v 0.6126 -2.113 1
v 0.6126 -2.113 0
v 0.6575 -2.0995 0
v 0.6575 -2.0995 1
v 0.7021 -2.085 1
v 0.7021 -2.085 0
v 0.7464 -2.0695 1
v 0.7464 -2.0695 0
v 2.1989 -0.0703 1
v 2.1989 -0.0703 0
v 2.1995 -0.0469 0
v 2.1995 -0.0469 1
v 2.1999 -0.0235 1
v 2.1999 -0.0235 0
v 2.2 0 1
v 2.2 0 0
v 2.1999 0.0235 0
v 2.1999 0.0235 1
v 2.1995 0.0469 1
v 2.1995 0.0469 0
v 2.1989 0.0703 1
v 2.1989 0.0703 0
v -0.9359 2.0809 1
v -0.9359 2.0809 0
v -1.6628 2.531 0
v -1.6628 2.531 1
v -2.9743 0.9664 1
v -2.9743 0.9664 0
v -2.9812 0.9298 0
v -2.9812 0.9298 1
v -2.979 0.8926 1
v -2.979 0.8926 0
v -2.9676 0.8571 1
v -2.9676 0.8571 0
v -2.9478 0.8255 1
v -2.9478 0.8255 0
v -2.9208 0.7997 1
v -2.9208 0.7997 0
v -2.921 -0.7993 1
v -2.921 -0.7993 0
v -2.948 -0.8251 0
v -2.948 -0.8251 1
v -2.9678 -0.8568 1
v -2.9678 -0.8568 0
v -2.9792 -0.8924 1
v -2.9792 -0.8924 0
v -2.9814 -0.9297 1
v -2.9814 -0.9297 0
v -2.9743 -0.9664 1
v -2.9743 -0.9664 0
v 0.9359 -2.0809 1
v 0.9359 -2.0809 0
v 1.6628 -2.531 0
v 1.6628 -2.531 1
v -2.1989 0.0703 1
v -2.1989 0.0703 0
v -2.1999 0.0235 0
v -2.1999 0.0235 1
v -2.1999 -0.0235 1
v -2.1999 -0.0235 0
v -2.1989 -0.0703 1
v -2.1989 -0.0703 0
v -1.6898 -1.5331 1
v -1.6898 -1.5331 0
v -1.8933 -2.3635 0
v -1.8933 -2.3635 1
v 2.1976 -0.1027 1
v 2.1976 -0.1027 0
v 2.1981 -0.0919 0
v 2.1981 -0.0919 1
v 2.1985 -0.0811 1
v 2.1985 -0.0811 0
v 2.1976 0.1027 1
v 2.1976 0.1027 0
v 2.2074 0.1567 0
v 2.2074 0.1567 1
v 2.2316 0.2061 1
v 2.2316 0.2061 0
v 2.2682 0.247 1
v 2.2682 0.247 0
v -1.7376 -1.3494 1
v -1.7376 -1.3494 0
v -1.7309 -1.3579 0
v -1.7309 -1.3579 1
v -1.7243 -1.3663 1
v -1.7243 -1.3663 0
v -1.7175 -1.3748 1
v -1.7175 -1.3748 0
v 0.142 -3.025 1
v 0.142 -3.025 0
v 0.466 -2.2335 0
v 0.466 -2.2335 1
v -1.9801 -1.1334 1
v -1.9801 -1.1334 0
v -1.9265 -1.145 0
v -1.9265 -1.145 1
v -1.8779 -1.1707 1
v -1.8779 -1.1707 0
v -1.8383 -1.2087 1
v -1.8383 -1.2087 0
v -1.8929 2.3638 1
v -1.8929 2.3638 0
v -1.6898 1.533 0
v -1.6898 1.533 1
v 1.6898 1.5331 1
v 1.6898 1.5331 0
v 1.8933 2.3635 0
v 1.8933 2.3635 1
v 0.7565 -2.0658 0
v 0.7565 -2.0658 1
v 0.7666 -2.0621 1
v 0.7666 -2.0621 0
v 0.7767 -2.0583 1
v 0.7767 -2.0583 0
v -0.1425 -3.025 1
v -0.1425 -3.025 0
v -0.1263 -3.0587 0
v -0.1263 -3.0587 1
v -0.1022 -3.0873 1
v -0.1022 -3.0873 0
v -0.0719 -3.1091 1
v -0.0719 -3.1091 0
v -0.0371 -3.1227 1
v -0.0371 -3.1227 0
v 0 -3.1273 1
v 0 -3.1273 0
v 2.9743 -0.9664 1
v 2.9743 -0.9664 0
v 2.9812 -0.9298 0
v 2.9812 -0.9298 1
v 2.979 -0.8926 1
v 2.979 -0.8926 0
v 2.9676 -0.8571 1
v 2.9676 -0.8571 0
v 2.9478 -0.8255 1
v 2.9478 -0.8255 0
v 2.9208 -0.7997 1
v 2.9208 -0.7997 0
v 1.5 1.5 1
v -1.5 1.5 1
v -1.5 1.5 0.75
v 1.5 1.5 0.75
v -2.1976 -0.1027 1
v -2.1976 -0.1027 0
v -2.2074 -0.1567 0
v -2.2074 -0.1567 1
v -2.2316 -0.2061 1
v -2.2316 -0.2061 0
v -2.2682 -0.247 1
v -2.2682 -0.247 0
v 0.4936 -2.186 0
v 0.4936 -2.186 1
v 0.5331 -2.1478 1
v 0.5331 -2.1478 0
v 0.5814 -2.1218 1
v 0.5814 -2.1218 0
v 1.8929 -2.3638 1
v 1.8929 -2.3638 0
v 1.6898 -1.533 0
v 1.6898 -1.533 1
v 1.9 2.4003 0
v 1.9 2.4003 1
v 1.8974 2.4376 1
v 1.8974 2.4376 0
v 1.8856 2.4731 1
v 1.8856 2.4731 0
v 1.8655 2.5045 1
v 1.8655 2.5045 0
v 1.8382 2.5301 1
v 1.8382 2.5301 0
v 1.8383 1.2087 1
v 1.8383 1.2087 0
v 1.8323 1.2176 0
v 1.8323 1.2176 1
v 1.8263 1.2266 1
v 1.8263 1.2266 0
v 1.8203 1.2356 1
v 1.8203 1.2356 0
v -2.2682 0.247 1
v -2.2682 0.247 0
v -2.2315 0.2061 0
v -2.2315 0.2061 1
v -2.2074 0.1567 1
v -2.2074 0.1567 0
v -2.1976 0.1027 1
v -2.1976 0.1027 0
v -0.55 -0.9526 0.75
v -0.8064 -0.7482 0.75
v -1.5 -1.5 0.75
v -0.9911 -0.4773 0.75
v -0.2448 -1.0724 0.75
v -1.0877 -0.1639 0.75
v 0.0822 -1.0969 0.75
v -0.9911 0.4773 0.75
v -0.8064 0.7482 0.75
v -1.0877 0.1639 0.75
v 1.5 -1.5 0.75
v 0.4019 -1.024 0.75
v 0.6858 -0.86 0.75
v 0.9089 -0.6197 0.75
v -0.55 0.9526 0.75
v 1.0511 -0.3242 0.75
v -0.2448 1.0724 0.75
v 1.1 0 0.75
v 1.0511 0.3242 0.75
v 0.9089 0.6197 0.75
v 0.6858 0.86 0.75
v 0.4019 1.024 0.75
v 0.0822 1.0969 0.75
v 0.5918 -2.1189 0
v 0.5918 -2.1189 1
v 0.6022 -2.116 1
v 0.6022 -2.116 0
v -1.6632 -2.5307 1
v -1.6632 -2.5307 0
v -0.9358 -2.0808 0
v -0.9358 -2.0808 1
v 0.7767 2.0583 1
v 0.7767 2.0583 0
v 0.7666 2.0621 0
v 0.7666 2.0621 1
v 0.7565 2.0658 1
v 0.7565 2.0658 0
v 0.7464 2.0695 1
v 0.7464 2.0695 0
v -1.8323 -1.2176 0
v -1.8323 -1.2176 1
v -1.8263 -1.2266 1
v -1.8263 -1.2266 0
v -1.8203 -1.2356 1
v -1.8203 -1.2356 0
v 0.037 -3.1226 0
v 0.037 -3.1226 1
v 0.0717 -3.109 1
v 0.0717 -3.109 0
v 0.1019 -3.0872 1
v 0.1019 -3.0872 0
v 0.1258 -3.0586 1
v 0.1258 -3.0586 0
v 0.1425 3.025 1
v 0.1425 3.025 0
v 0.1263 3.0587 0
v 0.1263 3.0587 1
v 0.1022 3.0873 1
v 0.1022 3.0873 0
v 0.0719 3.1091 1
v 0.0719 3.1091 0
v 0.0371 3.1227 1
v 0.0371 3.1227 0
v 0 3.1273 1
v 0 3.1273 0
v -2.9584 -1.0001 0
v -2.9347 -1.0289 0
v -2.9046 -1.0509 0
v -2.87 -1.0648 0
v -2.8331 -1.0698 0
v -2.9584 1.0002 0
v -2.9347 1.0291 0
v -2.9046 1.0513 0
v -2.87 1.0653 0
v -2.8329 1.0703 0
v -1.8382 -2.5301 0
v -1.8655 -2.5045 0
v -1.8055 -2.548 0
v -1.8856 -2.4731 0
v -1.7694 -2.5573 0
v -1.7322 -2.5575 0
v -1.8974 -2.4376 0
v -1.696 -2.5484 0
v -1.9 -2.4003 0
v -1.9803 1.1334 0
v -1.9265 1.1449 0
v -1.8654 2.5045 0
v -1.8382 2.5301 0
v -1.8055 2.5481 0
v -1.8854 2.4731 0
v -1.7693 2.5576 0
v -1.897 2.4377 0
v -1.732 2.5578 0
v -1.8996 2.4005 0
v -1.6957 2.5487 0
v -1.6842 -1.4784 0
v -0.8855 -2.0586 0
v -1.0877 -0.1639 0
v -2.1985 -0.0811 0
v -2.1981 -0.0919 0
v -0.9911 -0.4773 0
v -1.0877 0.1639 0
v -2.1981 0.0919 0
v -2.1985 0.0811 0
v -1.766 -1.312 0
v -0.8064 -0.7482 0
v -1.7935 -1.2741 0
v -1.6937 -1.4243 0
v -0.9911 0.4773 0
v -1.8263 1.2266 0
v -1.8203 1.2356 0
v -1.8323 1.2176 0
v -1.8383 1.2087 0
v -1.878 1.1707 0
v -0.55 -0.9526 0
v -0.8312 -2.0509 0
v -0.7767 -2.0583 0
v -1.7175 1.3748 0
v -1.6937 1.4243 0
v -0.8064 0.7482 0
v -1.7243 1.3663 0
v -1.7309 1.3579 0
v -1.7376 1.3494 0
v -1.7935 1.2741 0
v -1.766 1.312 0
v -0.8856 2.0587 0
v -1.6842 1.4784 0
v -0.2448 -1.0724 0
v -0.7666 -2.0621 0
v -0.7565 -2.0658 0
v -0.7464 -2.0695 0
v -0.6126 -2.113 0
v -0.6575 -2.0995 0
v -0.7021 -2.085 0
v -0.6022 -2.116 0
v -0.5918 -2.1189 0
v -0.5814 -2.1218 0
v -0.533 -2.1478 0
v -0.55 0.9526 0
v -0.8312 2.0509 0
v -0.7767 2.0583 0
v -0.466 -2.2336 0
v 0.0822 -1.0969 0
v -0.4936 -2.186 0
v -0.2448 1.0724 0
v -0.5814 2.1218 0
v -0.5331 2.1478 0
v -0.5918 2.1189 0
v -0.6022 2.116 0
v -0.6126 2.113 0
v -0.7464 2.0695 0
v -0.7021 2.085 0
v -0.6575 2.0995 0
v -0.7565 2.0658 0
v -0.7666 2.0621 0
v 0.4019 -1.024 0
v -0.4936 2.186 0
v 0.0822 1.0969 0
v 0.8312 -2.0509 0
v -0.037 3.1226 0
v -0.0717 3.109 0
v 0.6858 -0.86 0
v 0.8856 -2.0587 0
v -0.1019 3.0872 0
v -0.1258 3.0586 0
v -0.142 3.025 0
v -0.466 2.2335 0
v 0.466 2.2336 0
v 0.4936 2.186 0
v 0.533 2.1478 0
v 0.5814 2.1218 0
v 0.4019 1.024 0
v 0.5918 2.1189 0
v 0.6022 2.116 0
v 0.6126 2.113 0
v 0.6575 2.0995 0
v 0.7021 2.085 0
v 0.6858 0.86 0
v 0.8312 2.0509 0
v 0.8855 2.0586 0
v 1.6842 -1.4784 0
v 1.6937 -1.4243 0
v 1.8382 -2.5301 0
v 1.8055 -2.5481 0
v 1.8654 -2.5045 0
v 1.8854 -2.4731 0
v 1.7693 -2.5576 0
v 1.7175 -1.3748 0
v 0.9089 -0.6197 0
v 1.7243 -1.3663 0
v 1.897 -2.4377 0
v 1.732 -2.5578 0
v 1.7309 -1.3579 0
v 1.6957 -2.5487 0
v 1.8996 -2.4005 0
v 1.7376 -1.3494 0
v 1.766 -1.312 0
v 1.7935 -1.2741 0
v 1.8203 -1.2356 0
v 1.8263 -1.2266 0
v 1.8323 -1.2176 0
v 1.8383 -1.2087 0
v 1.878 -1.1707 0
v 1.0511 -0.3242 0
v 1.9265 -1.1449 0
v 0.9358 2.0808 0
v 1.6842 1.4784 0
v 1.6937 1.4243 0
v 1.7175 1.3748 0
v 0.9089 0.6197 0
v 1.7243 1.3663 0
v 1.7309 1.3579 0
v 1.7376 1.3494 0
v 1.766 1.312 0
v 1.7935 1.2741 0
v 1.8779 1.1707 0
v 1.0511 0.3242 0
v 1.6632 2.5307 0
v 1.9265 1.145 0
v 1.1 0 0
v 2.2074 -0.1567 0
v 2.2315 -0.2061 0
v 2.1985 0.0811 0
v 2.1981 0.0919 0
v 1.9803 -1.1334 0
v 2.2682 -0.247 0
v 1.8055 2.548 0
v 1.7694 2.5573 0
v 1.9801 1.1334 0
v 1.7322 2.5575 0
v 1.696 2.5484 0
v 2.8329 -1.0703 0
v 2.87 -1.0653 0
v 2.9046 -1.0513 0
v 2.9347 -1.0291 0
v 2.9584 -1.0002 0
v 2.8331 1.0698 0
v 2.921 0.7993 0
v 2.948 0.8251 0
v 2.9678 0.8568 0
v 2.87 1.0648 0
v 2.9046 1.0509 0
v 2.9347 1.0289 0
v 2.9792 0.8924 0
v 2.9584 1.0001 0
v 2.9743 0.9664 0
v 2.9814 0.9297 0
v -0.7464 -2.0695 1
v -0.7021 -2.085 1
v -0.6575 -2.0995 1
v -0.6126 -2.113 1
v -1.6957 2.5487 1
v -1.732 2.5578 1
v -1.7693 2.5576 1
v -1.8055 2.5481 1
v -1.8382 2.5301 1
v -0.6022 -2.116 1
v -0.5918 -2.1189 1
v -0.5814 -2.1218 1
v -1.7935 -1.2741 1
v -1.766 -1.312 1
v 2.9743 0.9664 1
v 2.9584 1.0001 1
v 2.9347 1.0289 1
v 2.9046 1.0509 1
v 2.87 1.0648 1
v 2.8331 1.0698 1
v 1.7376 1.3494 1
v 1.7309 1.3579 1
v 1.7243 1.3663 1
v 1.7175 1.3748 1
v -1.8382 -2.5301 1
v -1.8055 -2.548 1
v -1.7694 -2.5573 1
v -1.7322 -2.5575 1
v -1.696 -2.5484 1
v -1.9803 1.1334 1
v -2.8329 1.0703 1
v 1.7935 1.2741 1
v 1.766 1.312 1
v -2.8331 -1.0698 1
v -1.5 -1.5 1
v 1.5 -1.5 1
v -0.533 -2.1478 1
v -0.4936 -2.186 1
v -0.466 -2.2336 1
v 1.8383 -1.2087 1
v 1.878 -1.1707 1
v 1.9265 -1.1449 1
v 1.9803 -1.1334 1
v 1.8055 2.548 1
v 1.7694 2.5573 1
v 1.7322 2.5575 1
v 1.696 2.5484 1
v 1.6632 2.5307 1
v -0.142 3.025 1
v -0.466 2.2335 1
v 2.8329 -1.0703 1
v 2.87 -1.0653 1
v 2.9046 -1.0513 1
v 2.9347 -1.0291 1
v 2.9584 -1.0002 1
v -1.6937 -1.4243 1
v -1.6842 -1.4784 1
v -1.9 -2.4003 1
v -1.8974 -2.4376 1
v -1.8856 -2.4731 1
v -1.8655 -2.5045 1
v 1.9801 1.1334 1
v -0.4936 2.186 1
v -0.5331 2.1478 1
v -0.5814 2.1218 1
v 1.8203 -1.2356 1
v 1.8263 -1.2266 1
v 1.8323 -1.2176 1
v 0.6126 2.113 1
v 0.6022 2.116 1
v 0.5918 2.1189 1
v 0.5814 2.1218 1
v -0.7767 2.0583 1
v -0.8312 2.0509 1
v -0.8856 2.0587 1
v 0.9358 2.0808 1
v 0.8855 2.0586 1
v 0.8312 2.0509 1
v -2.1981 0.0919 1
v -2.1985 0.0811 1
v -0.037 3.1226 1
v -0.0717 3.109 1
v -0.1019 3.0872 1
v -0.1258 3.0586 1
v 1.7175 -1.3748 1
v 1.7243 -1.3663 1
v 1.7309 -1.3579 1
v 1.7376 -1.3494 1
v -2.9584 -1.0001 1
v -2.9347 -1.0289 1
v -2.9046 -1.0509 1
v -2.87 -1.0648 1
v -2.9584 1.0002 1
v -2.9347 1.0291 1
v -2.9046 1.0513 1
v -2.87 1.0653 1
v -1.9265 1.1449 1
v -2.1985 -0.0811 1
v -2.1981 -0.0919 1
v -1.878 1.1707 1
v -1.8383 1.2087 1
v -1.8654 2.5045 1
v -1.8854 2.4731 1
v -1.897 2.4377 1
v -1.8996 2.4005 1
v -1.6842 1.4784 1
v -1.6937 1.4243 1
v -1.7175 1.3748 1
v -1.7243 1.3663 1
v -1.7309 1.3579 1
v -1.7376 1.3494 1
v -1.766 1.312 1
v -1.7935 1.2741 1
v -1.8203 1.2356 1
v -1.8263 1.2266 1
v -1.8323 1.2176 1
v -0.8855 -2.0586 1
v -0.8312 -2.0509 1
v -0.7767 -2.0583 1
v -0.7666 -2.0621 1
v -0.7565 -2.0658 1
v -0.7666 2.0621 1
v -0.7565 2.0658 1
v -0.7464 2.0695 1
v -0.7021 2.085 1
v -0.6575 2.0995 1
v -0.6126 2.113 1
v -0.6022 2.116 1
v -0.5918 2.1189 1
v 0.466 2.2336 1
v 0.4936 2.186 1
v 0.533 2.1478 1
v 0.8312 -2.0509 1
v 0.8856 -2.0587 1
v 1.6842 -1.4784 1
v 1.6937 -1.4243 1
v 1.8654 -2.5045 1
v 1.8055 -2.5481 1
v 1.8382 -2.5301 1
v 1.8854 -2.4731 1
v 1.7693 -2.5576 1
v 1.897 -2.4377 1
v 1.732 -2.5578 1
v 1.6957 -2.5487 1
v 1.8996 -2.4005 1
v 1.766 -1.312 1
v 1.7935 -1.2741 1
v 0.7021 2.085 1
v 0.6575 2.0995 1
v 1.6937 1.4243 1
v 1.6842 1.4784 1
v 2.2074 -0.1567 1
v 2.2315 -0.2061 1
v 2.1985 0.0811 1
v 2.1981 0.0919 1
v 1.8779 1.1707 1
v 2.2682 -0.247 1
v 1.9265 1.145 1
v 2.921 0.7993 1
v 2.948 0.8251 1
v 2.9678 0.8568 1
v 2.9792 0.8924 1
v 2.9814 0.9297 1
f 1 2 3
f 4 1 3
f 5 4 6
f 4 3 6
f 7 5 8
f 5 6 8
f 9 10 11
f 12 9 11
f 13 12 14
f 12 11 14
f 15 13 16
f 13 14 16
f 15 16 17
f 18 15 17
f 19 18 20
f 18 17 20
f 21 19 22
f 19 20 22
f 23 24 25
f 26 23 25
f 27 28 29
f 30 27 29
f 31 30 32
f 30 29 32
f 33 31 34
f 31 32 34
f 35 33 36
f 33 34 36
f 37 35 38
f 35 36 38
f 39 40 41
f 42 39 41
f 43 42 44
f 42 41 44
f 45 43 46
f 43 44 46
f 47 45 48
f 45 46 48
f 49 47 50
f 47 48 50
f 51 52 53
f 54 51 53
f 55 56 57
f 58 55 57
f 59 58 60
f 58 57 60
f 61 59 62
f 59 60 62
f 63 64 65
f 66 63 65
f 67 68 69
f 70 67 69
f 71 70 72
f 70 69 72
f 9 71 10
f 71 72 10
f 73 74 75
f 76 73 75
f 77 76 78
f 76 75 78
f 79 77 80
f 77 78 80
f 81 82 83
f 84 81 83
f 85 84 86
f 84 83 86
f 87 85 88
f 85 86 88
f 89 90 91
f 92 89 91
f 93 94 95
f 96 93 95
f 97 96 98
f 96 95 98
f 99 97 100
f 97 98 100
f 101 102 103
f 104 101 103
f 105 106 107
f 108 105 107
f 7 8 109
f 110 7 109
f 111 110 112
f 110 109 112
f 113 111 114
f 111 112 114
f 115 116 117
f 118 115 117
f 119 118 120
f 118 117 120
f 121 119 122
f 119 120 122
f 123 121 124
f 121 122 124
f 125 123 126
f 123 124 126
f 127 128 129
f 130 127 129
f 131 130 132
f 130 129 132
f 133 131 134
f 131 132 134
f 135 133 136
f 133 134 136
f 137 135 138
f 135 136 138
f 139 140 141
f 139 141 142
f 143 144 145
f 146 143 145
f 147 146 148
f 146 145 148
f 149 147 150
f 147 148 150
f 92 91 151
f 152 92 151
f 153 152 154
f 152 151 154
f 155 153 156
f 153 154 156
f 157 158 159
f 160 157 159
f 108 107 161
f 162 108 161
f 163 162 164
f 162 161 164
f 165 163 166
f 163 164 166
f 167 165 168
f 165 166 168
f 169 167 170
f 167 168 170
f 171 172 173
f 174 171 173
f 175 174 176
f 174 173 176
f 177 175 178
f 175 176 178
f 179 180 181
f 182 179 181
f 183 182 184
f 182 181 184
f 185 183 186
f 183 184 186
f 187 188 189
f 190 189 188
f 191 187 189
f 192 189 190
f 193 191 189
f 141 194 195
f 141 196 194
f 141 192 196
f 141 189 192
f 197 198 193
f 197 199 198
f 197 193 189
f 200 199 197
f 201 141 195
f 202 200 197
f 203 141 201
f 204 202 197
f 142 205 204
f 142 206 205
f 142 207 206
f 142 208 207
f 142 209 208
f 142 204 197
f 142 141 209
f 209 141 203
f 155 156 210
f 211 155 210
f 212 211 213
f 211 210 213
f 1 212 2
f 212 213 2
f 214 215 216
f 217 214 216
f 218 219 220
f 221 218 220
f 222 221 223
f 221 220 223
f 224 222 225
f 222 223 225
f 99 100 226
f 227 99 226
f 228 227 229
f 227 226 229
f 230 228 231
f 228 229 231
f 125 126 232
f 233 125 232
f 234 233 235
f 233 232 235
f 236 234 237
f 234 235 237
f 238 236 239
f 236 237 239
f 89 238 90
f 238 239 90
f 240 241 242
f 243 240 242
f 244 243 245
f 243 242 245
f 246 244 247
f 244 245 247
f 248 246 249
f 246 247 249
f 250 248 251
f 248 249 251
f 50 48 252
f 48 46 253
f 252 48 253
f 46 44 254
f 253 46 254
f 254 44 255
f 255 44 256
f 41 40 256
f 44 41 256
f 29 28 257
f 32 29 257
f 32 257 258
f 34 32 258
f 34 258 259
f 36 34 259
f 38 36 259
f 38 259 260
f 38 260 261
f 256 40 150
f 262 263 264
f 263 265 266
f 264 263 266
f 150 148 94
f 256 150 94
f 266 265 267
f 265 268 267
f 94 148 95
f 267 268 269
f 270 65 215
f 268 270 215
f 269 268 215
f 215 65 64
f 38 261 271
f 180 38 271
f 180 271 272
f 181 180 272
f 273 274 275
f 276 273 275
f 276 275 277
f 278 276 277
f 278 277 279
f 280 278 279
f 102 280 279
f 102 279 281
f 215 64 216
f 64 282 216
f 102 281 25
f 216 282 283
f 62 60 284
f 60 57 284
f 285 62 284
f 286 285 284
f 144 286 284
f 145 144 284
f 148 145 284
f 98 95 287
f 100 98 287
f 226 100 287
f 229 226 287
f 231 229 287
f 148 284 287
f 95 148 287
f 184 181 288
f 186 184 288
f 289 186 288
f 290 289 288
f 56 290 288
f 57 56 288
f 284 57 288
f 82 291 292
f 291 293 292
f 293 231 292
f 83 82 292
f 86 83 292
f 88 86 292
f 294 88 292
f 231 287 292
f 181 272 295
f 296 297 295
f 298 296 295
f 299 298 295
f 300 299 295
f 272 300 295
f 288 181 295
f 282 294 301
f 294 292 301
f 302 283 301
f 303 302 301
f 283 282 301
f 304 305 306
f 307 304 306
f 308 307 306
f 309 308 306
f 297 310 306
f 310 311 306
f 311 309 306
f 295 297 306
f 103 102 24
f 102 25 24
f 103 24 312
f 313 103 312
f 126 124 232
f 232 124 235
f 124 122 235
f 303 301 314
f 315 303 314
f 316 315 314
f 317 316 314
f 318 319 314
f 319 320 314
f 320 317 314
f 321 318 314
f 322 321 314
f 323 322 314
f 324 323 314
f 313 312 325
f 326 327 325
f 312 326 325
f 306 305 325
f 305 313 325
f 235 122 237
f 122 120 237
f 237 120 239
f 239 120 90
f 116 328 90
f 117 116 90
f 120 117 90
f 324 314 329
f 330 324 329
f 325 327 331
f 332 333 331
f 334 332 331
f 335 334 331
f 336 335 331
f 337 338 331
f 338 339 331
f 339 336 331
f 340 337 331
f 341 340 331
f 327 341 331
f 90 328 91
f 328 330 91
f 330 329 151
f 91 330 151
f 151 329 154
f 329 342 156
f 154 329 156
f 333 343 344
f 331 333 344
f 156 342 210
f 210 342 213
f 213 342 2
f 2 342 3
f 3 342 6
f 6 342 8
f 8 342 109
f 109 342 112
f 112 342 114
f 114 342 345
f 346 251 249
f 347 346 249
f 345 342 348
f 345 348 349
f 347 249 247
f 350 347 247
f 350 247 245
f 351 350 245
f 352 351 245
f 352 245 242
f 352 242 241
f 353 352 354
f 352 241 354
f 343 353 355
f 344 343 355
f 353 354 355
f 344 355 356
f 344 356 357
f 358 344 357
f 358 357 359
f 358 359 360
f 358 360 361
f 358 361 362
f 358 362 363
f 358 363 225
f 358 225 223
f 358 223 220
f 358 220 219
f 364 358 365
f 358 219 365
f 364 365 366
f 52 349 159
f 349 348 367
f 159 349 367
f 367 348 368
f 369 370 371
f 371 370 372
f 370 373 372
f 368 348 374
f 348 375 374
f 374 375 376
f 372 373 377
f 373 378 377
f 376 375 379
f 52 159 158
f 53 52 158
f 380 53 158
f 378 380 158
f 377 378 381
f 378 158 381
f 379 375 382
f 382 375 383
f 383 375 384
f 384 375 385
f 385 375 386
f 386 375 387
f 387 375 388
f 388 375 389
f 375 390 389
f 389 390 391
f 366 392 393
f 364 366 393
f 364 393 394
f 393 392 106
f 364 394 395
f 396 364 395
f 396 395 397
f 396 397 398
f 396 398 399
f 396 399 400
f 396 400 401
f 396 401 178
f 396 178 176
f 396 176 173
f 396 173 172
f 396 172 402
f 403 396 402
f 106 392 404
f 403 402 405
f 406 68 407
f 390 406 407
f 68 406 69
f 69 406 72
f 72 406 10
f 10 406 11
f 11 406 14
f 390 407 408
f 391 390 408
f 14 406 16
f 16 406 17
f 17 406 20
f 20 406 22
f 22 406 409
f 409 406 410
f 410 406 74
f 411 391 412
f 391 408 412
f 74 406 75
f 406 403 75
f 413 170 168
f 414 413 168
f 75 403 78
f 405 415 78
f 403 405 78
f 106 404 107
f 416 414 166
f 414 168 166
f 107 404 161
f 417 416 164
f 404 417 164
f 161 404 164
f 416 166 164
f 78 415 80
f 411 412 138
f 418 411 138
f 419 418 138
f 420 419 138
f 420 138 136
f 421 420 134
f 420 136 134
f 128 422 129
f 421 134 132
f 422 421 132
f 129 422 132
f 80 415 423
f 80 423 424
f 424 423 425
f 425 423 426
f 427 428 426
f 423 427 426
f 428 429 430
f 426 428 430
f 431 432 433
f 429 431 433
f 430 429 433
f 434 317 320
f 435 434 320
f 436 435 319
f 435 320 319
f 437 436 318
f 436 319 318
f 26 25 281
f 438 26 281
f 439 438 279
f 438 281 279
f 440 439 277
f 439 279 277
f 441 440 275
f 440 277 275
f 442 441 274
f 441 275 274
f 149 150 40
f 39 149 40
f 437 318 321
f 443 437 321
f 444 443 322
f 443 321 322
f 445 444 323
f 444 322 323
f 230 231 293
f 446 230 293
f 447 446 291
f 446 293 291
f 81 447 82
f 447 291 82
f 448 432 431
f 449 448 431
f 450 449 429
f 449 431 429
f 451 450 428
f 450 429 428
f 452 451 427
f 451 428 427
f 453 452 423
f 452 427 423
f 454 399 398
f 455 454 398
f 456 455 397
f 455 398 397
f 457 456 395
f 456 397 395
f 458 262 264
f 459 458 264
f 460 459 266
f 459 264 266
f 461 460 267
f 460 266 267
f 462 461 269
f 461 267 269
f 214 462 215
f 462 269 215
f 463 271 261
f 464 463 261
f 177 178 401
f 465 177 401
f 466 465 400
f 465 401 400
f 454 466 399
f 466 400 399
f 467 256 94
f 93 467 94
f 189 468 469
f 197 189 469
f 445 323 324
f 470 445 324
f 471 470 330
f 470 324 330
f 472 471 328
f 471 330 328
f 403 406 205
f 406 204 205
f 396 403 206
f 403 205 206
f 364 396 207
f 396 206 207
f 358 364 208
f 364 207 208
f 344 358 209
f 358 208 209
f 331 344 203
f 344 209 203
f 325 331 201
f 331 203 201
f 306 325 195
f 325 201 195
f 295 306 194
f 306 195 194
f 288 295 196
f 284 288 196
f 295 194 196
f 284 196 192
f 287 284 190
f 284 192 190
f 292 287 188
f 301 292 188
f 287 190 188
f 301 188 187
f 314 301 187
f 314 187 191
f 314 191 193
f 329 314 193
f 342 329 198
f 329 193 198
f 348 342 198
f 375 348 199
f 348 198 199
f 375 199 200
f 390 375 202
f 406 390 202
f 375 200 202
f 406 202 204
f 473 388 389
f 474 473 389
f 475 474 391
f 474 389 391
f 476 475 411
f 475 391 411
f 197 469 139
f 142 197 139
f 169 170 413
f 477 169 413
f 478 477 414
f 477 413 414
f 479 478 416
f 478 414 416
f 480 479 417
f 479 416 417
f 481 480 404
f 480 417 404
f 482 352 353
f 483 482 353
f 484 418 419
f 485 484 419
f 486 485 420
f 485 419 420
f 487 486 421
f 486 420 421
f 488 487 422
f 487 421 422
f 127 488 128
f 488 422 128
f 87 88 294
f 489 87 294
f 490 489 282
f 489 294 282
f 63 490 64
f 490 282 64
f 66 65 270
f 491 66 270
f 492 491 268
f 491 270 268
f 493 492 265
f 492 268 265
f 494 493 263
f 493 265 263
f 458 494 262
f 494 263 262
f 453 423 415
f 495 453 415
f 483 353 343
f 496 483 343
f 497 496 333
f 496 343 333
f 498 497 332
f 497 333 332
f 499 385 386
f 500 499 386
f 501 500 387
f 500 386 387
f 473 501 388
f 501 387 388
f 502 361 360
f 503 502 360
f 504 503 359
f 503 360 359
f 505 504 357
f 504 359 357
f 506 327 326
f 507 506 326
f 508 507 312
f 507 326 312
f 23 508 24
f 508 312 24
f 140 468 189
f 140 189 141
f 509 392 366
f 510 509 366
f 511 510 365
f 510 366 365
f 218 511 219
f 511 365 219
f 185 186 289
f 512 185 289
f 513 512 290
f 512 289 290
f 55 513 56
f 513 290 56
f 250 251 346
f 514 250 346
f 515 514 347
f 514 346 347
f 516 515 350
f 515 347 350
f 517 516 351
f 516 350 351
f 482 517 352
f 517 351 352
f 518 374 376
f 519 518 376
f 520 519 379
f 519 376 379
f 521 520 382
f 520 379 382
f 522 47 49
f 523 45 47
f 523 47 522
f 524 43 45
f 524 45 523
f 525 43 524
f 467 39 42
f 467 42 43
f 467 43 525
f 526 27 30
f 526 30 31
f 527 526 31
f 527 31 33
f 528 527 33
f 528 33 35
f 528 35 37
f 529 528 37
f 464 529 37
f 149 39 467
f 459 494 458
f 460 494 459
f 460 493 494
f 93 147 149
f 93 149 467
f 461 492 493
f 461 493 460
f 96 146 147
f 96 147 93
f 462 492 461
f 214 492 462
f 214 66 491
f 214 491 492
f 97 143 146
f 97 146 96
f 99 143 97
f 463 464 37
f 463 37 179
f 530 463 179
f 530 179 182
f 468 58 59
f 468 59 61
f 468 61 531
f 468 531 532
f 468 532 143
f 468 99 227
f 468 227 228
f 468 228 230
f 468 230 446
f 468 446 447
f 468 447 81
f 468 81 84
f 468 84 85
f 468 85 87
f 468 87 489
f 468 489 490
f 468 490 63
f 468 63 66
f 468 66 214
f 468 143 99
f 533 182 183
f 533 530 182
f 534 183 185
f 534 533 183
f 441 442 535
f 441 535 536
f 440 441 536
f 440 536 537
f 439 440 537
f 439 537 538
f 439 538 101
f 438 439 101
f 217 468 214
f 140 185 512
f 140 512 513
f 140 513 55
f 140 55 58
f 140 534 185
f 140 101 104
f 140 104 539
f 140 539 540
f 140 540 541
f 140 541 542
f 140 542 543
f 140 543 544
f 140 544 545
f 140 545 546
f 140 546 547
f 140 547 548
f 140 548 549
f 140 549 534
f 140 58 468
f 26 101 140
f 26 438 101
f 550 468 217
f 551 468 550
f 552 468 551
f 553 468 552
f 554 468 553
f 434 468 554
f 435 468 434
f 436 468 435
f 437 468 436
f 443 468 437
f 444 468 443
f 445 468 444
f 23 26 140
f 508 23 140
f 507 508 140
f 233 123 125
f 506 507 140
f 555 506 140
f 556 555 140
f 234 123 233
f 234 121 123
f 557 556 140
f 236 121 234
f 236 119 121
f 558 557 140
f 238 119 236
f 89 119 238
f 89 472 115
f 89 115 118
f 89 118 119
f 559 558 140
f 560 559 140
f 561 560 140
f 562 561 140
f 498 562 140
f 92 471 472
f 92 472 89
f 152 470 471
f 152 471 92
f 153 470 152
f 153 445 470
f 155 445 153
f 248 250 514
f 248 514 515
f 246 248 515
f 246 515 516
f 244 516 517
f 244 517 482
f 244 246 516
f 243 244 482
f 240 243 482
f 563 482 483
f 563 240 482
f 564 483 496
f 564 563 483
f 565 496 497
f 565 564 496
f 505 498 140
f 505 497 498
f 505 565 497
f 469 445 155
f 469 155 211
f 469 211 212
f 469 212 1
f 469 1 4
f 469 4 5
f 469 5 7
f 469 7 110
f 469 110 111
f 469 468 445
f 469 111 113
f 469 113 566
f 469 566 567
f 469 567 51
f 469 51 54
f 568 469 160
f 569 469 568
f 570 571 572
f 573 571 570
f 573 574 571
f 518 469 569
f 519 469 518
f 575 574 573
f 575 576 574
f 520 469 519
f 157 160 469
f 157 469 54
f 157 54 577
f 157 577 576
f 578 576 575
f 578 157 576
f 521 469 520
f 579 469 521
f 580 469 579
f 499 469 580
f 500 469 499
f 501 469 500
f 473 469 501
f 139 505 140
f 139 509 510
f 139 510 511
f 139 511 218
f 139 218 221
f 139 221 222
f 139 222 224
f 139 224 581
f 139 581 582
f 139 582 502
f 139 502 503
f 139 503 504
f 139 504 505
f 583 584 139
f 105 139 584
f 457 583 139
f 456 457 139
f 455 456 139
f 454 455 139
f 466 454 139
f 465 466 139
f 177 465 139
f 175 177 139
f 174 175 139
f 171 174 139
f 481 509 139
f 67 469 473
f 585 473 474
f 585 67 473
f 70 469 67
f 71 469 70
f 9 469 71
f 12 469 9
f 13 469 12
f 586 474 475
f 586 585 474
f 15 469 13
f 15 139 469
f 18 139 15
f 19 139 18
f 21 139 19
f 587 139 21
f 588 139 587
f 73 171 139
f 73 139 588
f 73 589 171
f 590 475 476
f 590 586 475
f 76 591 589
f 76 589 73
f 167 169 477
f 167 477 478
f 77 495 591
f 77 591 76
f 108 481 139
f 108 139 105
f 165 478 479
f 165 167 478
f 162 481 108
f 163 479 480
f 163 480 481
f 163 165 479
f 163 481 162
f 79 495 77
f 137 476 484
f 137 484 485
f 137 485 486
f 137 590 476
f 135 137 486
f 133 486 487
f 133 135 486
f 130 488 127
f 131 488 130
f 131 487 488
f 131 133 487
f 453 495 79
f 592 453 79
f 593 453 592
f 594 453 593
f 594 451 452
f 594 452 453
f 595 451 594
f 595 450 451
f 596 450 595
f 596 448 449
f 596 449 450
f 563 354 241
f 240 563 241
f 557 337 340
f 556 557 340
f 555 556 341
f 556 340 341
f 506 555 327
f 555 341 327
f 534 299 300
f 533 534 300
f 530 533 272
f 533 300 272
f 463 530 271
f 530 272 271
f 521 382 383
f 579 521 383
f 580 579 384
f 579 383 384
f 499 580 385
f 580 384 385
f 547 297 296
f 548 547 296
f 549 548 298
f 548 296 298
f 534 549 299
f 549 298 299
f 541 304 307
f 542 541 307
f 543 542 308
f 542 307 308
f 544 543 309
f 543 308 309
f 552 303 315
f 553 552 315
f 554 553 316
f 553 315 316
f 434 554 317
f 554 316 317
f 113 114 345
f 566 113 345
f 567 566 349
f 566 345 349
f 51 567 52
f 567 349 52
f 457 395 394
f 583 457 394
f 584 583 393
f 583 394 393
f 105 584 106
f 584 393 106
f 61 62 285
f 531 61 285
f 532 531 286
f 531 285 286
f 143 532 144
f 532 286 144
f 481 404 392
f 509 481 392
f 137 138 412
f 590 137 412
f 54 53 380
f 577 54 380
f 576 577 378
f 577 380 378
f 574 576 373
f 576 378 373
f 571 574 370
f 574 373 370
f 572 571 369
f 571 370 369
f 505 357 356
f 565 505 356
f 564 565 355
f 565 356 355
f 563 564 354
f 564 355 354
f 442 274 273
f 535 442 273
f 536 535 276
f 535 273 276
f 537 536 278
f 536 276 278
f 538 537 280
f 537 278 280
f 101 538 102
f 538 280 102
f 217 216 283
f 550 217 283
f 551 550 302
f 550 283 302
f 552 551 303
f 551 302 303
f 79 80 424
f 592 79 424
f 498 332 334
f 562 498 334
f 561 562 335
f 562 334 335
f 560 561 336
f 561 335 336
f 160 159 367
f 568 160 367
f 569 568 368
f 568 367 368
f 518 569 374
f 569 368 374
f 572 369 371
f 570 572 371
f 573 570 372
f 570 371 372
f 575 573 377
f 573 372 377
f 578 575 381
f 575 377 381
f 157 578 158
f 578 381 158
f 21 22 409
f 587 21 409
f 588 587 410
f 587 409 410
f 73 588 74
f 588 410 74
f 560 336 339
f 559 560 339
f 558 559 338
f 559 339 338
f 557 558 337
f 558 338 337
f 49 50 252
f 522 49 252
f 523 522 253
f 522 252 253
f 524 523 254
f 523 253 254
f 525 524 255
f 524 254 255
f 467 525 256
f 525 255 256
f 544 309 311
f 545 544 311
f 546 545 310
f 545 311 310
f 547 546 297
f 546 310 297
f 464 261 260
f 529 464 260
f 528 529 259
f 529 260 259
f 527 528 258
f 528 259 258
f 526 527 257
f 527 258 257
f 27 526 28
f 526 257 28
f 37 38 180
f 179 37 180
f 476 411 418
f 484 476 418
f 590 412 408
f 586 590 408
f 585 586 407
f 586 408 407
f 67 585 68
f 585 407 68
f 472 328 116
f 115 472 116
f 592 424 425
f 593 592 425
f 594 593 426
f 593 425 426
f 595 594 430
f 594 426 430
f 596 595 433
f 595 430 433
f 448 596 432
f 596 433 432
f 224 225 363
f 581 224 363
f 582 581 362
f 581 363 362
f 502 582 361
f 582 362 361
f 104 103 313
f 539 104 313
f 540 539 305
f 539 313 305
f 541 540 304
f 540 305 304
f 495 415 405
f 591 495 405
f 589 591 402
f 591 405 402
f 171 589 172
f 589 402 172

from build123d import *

# Parameters (mm, degrees)
F1_DEPTH        = 1
F1_COPIES_COUNT = 10
F3_W            = 3
F3_H            = 3
F4_DEPTH        = 0.25
F5_DEPTH        = 1
F6_DEPTH        = 0.25
F7_R            = 1.1
F8_DEPTH        = 1.31


# Not quite as in the source:
# - ends of sketch curves that miss each other by under 0.0002 mm in the source are joined
# - a feature of the source that left no trace in its solid (it failed there, or was rolled back) is left out
# - a pattern or mirror of a feature is missing from the dataset's text; its kind, count and spacing are read off the source's solid


with BuildPart() as f1:
    # F0 (on Top) → F1 (new body)
    with BuildSketch(Plane.XY):
        with BuildLine():
            ThreePointArc((0.581444512, 2.1217733808), (0.2933415776, 2.1803556405), (0, 2.2))
            ThreePointArc((0, 2.2), (-0.2933416878, 2.1803556256), (-0.5814447265, 2.121773322))
            ThreePointArc((-0.5814447265, 2.121773322), (-0.5968372157, 2.1167523736), (-0.6125853979, 2.1129929319))
            ThreePointArc((-0.6125853979, 2.1129929319), (-1.3214219849, -1.7589326132), (2.2, 0))
            ThreePointArc((2.2, 0), (1.7589325969, 1.3214220066), (0.612585346, 2.112992947))
            ThreePointArc((0.6125853416, 2.1129929319), (0.5968370782, 2.1167523965), (0.581444512, 2.1217733808))
        make_face()
        with BuildLine():
            ThreePointArc((0.6, 0.8), (0, -1), (-0.6, 0.8))
            Line((-0.6, 0.8), (0, 0.8))
            Line((0, 0.8), (0.6, 0.8))
        make_face(mode=Mode.SUBTRACT)
        with BuildLine():
            ThreePointArc((-0.5814447265, 2.121773322), (-0.2933416878, 2.1803556256), (0, 2.2))
            Line((0, 2.2), (0, 2.8273255734))
            ThreePointArc((0, 2.8273255734), (-0.1215931939, 2.889819495), (-0.1419835484, 3.0250031792))
            Line((-0.1419835484, 3.0250031792), (-0.4660251262, 2.233467269))
            ThreePointArc((-0.4660251262, 2.233467269), (-0.5120300634, 2.1655250062), (-0.5814447265, 2.121773322))
        make_face()
        with BuildLine():
            Line((0, 2.8273255734), (0, 2.2))
            ThreePointArc((0, 2.2), (0.2933415776, 2.1803556405), (0.581444512, 2.1217733808))
            ThreePointArc((0.581444512, 2.1217733808), (0.5119904355, 2.165563311), (0.4659834267, 2.2335690598))
            Line((0.4659834267, 2.2335690598), (0.1424618925, 3.0249932315))
            ThreePointArc((0.1424618925, 3.0249932315), (0.1482808399, 3.0014743175), (0.1502375048, 2.9773253853))
            ThreePointArc((0.1502375048, 2.9773253853), (0.1062195181, 2.8711754307), (0, 2.8273255734))
        make_face()
        with BuildLine():
            ThreePointArc((-0.1419835484, 3.0250031792), (-0.1215931939, 2.889819495), (0, 2.8273255734))
            Line((0, 2.8273255734), (0, 3.1273251973))
            ThreePointArc((0, 3.1273251973), (-0.0874611784, 3.0990173775), (-0.1419835484, 3.0250031792))
        make_face()
        with BuildLine():
            Line((0, 3.1273251973), (0, 2.8273255734))
            ThreePointArc((0, 2.8273255734), (0.1062195181, 2.8711754307), (0.1502375048, 2.9773253853))
            ThreePointArc((0.1502375048, 2.9773253853), (0.1482808399, 3.0014743175), (0.1424618925, 3.0249932315))
            ThreePointArc((0.1424618925, 3.0249932315), (0.0877476558, 3.0991530237), (0, 3.1273251973))
        make_face()
        with BuildLine():
            ThreePointArc((0.612585346, 2.112992947), (0.5970310708, 2.1174404125), (0.581444512, 2.1217733808))
            ThreePointArc((0.581444512, 2.1217733808), (0.5968370782, 2.1167523965), (0.6125853416, 2.1129929319))
        make_face()
        with BuildLine():
            ThreePointArc((-0.6125853979, 2.1129929319), (-0.5968372157, 2.1167523736), (-0.5814447265, 2.121773322))
            ThreePointArc((-0.5814447265, 2.121773322), (-0.5970312038, 2.117440375), (-0.6125853979, 2.1129929319))
        make_face()
    extrude(amount=F1_DEPTH)

    # F1_copies: F1 ×10 about axis
    f1_copies_axis = Axis((0, 0, 0), (0, 0, 1))


with BuildPart() as f1_1:
    add(f1.part)
    for i in range(1, F1_COPIES_COUNT):
        add(f1.part.rotate(f1_copies_axis, i * 360 / F1_COPIES_COUNT))

    # F3 (on face) → F4 (cut)
    with BuildSketch(Plane.XY.offset(1)):
        Rectangle(F3_W, F3_H)
    extrude(amount=-F4_DEPTH, mode=Mode.SUBTRACT)

    # F0 (on Top) → F5 (join)
    with BuildSketch(Plane.XY):
        with BuildLine():
            ThreePointArc((0.581444512, 2.1217733808), (0.2933415776, 2.1803556405), (0, 2.2))
            ThreePointArc((0, 2.2), (-0.2933416878, 2.1803556256), (-0.5814447265, 2.121773322))
            ThreePointArc((-0.5814447265, 2.121773322), (-0.5968372157, 2.1167523736), (-0.6125853979, 2.1129929319))
            ThreePointArc((-0.6125853979, 2.1129929319), (-1.3214219849, -1.7589326132), (2.2, 0))
            ThreePointArc((2.2, 0), (1.7589325969, 1.3214220066), (0.612585346, 2.112992947))
            ThreePointArc((0.6125853416, 2.1129929319), (0.5968370782, 2.1167523965), (0.581444512, 2.1217733808))
        make_face()
        with BuildLine():
            ThreePointArc((0.6, 0.8), (0, -1), (-0.6, 0.8))
            Line((-0.6, 0.8), (0, 0.8))
            Line((0, 0.8), (0.6, 0.8))
        make_face(mode=Mode.SUBTRACT)
        with BuildLine():
            ThreePointArc((-0.5814447265, 2.121773322), (-0.2933416878, 2.1803556256), (0, 2.2))
            Line((0, 2.2), (0, 2.8273255734))
            ThreePointArc((0, 2.8273255734), (-0.1215931939, 2.889819495), (-0.1419835484, 3.0250031792))
            Line((-0.1419835484, 3.0250031792), (-0.4660251262, 2.233467269))
            ThreePointArc((-0.4660251262, 2.233467269), (-0.5120300634, 2.1655250062), (-0.5814447265, 2.121773322))
        make_face()
        with BuildLine():
            Line((0, 2.8273255734), (0, 2.2))
            ThreePointArc((0, 2.2), (0.2933415776, 2.1803556405), (0.581444512, 2.1217733808))
            ThreePointArc((0.581444512, 2.1217733808), (0.5119904355, 2.165563311), (0.4659834267, 2.2335690598))
            Line((0.4659834267, 2.2335690598), (0.1424618925, 3.0249932315))
            ThreePointArc((0.1424618925, 3.0249932315), (0.1482808399, 3.0014743175), (0.1502375048, 2.9773253853))
            ThreePointArc((0.1502375048, 2.9773253853), (0.1062195181, 2.8711754307), (0, 2.8273255734))
        make_face()
        with BuildLine():
            ThreePointArc((-0.1419835484, 3.0250031792), (-0.1215931939, 2.889819495), (0, 2.8273255734))
            Line((0, 2.8273255734), (0, 3.1273251973))
            ThreePointArc((0, 3.1273251973), (-0.0874611784, 3.0990173775), (-0.1419835484, 3.0250031792))
        make_face()
        with BuildLine():
            Line((0, 3.1273251973), (0, 2.8273255734))
            ThreePointArc((0, 2.8273255734), (0.1062195181, 2.8711754307), (0.1502375048, 2.9773253853))
            ThreePointArc((0.1502375048, 2.9773253853), (0.1482808399, 3.0014743175), (0.1424618925, 3.0249932315))
            ThreePointArc((0.1424618925, 3.0249932315), (0.0877476558, 3.0991530237), (0, 3.1273251973))
        make_face()
        with BuildLine():
            ThreePointArc((0.612585346, 2.112992947), (0.5970310708, 2.1174404125), (0.581444512, 2.1217733808))
            ThreePointArc((0.581444512, 2.1217733808), (0.5968370782, 2.1167523965), (0.6125853416, 2.1129929319))
        make_face()
        with BuildLine():
            ThreePointArc((-0.6125853979, 2.1129929319), (-0.5968372157, 2.1167523736), (-0.5814447265, 2.121773322))
            ThreePointArc((-0.5814447265, 2.121773322), (-0.5970312038, 2.117440375), (-0.6125853979, 2.1129929319))
        make_face()
    extrude(amount=F5_DEPTH)

    # F3 (on face) → F6 (cut)
    with BuildSketch(Plane.XY.offset(1)):
        Rectangle(F3_W, F3_H)
        Polygon((-0.259935757, 0.8), (0.259935757, 0.8), (0.6805206467, 0.494427191), (0.8411697794, 0), (0.6805206467, -0.494427191), (0.259935757, -0.8), (-0.259935757, -0.8), (-0.6805206467, -0.494427191), (-0.8411697794, 0), (-0.6805206467, 0.494427191), align=None, mode=Mode.SUBTRACT)
    extrude(amount=-F6_DEPTH, mode=Mode.SUBTRACT)

    # F7 (on face) → F8 (cut, symmetric)
    with BuildSketch(Plane.XY.offset(1)):
        Circle(F7_R)
    extrude(amount=F8_DEPTH, both=True, mode=Mode.SUBTRACT)


solid = f1_1.part
